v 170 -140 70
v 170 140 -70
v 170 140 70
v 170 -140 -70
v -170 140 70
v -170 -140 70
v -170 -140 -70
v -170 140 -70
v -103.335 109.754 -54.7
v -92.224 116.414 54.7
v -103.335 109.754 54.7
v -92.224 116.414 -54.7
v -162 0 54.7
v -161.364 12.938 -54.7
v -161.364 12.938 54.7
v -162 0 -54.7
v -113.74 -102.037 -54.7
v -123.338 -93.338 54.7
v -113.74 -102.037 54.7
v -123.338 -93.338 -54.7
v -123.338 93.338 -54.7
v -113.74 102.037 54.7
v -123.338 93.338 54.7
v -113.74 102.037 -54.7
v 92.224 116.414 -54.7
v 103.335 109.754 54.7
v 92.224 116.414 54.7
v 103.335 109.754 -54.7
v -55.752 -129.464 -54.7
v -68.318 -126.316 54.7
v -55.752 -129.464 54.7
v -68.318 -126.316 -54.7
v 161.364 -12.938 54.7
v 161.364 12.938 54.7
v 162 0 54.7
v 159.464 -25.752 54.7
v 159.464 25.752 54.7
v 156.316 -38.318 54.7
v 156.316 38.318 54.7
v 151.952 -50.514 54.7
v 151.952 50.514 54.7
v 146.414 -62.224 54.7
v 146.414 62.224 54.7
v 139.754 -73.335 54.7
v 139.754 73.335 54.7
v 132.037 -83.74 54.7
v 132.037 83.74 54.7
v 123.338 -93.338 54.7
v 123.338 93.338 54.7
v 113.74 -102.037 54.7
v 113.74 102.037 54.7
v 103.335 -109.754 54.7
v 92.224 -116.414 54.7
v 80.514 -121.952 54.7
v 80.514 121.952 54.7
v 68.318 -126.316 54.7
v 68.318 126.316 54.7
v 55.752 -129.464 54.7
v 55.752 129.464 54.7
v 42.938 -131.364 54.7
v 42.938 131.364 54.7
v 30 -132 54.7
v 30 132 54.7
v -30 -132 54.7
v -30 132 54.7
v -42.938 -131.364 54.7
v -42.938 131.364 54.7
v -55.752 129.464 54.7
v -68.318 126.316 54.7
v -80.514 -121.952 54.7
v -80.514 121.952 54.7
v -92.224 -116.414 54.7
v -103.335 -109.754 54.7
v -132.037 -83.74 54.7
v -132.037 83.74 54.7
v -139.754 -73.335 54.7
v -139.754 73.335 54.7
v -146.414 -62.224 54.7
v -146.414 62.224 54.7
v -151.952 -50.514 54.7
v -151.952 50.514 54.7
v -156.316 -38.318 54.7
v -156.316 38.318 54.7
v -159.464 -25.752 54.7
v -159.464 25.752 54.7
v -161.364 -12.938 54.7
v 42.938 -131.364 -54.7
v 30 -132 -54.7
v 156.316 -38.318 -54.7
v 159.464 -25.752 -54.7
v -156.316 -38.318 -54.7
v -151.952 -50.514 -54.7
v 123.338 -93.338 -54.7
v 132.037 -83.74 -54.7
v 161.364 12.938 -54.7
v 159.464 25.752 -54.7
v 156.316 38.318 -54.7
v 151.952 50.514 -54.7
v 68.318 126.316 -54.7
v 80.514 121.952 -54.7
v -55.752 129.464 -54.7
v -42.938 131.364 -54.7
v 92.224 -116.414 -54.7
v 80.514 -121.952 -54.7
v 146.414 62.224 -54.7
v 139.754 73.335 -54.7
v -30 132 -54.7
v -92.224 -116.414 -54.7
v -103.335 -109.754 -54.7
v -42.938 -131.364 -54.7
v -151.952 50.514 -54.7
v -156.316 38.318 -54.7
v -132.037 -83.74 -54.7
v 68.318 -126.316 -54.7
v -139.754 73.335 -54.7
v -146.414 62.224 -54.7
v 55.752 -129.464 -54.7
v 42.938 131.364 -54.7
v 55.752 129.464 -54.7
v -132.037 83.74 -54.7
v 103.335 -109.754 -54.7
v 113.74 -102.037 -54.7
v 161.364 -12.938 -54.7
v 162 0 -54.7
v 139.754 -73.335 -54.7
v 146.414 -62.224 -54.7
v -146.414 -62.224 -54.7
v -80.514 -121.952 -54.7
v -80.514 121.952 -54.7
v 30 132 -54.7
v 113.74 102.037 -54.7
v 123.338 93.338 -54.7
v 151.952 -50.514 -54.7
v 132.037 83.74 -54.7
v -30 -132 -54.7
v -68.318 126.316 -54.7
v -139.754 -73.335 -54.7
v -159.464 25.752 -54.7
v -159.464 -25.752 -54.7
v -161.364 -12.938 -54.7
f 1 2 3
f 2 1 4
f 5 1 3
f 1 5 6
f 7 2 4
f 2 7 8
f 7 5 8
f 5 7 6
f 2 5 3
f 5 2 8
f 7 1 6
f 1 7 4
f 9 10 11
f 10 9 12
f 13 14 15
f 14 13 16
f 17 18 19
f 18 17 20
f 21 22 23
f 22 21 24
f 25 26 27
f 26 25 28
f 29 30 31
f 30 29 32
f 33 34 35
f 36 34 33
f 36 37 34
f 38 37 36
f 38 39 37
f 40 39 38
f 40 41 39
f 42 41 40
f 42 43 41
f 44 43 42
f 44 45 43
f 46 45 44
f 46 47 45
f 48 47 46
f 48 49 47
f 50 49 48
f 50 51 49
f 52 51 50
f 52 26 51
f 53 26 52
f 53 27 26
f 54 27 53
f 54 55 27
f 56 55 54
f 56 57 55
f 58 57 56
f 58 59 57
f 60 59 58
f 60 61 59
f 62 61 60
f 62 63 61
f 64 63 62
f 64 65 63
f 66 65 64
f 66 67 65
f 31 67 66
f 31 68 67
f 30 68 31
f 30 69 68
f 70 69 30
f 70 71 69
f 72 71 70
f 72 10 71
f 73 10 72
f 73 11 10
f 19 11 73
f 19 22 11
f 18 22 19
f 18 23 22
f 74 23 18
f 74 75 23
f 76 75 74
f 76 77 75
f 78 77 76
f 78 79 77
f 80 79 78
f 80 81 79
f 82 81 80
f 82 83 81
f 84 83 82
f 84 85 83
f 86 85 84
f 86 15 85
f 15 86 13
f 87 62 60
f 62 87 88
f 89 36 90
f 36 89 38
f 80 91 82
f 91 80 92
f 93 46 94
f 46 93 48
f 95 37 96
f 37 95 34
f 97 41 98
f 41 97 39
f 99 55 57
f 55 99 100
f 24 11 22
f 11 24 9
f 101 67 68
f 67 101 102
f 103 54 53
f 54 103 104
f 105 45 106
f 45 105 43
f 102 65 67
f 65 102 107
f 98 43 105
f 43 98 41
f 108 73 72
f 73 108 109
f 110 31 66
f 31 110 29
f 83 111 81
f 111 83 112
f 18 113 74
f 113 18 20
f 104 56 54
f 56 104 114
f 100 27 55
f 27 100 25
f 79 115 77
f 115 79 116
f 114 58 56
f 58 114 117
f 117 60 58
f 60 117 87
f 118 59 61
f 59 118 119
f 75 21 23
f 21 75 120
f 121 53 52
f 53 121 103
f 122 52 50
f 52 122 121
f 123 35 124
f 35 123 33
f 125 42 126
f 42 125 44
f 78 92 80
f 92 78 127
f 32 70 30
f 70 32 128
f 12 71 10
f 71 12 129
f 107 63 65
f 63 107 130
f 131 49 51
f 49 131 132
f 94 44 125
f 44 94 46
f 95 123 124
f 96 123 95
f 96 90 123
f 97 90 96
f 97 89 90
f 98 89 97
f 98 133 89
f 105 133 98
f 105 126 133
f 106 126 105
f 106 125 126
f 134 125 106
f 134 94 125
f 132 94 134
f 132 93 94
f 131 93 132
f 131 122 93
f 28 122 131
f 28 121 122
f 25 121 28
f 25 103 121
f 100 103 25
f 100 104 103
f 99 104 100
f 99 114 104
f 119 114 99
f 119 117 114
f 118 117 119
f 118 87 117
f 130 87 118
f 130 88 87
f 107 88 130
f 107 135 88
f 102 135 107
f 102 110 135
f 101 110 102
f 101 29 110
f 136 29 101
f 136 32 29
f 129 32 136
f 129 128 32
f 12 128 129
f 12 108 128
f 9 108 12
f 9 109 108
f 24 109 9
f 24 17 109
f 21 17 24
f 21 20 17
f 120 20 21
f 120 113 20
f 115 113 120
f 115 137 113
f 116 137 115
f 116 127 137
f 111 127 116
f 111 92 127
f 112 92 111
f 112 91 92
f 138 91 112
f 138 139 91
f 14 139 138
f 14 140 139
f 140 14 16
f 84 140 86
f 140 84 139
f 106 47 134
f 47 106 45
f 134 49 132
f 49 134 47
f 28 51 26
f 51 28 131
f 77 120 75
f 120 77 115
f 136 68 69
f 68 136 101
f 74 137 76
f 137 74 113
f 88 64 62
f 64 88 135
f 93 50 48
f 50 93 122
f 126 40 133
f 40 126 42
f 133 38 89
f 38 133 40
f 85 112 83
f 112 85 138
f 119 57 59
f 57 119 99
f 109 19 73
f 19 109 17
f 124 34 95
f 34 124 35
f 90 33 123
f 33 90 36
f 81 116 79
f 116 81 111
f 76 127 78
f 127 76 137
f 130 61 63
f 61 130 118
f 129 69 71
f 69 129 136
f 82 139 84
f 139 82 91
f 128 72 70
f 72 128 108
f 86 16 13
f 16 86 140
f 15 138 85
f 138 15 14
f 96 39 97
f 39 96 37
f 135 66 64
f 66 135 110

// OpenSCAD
// ============================================================================
// Atom Lithography Machine — Parametric OpenSCAD Module (S9.3-01)
// ============================================================================
// part_id           : S9.3-01
// parent_bom_id     : S9.3
// subsystem         : S9
// part_name         : Yedek MEMS apertur ve blanker plaka seti (2 eslesik takim)
// material          : Si
// temp_stage        : 300 K
// vacuum_grade      : UHV 1e-9 mbar
// tolerance         : ±50 nm CD
// computed_mass_kg  : 6.80000
// envelope_mm       : 368.800 x 296.400 x 140.000
// design_maturity   : M0_M1_DETAILED_CAD_DESIGN_ONLY
// no_lab_measurement: true
// iec61508_certified: false
// semi_s2_certified : false
// Units: millimeters (mm)
// ============================================================================

$fn = 64;

// Nominal bounding envelope parameters (mm)
bbox_x = 368.8000;
bbox_y = 296.4000;
bbox_z = 140.0000;

// Part-specific parametric dimensions
qty_sets = 2;
case_dx_mm = 340.0;
case_dy_mm = 280.0;
case_dz_mm = 140.0;

// Interface / port parameters (mm)

module part_S9_3_01() {
  difference() {
    union() {
      // Cleanroom ESD storage case outer envelope
      cube([340.000, 280.000, 140.000], center=true);
    }
    // Internal padded kit tray cavity
    hull() {
      translate([-30.000, 0, 0]) cylinder(d=264.000, h=109.400, center=true);
      translate([30.000, 0, 0]) cylinder(d=264.000, h=109.400, center=true);
    }
  }
}

// World assembly mounting transform (global machine frame, mm / deg):
// translate([-160.000, -1520.000, 70.000]) rotate([0.000, 0.000, 0.000]) part_S9_3_01();

part_S9_3_01();
